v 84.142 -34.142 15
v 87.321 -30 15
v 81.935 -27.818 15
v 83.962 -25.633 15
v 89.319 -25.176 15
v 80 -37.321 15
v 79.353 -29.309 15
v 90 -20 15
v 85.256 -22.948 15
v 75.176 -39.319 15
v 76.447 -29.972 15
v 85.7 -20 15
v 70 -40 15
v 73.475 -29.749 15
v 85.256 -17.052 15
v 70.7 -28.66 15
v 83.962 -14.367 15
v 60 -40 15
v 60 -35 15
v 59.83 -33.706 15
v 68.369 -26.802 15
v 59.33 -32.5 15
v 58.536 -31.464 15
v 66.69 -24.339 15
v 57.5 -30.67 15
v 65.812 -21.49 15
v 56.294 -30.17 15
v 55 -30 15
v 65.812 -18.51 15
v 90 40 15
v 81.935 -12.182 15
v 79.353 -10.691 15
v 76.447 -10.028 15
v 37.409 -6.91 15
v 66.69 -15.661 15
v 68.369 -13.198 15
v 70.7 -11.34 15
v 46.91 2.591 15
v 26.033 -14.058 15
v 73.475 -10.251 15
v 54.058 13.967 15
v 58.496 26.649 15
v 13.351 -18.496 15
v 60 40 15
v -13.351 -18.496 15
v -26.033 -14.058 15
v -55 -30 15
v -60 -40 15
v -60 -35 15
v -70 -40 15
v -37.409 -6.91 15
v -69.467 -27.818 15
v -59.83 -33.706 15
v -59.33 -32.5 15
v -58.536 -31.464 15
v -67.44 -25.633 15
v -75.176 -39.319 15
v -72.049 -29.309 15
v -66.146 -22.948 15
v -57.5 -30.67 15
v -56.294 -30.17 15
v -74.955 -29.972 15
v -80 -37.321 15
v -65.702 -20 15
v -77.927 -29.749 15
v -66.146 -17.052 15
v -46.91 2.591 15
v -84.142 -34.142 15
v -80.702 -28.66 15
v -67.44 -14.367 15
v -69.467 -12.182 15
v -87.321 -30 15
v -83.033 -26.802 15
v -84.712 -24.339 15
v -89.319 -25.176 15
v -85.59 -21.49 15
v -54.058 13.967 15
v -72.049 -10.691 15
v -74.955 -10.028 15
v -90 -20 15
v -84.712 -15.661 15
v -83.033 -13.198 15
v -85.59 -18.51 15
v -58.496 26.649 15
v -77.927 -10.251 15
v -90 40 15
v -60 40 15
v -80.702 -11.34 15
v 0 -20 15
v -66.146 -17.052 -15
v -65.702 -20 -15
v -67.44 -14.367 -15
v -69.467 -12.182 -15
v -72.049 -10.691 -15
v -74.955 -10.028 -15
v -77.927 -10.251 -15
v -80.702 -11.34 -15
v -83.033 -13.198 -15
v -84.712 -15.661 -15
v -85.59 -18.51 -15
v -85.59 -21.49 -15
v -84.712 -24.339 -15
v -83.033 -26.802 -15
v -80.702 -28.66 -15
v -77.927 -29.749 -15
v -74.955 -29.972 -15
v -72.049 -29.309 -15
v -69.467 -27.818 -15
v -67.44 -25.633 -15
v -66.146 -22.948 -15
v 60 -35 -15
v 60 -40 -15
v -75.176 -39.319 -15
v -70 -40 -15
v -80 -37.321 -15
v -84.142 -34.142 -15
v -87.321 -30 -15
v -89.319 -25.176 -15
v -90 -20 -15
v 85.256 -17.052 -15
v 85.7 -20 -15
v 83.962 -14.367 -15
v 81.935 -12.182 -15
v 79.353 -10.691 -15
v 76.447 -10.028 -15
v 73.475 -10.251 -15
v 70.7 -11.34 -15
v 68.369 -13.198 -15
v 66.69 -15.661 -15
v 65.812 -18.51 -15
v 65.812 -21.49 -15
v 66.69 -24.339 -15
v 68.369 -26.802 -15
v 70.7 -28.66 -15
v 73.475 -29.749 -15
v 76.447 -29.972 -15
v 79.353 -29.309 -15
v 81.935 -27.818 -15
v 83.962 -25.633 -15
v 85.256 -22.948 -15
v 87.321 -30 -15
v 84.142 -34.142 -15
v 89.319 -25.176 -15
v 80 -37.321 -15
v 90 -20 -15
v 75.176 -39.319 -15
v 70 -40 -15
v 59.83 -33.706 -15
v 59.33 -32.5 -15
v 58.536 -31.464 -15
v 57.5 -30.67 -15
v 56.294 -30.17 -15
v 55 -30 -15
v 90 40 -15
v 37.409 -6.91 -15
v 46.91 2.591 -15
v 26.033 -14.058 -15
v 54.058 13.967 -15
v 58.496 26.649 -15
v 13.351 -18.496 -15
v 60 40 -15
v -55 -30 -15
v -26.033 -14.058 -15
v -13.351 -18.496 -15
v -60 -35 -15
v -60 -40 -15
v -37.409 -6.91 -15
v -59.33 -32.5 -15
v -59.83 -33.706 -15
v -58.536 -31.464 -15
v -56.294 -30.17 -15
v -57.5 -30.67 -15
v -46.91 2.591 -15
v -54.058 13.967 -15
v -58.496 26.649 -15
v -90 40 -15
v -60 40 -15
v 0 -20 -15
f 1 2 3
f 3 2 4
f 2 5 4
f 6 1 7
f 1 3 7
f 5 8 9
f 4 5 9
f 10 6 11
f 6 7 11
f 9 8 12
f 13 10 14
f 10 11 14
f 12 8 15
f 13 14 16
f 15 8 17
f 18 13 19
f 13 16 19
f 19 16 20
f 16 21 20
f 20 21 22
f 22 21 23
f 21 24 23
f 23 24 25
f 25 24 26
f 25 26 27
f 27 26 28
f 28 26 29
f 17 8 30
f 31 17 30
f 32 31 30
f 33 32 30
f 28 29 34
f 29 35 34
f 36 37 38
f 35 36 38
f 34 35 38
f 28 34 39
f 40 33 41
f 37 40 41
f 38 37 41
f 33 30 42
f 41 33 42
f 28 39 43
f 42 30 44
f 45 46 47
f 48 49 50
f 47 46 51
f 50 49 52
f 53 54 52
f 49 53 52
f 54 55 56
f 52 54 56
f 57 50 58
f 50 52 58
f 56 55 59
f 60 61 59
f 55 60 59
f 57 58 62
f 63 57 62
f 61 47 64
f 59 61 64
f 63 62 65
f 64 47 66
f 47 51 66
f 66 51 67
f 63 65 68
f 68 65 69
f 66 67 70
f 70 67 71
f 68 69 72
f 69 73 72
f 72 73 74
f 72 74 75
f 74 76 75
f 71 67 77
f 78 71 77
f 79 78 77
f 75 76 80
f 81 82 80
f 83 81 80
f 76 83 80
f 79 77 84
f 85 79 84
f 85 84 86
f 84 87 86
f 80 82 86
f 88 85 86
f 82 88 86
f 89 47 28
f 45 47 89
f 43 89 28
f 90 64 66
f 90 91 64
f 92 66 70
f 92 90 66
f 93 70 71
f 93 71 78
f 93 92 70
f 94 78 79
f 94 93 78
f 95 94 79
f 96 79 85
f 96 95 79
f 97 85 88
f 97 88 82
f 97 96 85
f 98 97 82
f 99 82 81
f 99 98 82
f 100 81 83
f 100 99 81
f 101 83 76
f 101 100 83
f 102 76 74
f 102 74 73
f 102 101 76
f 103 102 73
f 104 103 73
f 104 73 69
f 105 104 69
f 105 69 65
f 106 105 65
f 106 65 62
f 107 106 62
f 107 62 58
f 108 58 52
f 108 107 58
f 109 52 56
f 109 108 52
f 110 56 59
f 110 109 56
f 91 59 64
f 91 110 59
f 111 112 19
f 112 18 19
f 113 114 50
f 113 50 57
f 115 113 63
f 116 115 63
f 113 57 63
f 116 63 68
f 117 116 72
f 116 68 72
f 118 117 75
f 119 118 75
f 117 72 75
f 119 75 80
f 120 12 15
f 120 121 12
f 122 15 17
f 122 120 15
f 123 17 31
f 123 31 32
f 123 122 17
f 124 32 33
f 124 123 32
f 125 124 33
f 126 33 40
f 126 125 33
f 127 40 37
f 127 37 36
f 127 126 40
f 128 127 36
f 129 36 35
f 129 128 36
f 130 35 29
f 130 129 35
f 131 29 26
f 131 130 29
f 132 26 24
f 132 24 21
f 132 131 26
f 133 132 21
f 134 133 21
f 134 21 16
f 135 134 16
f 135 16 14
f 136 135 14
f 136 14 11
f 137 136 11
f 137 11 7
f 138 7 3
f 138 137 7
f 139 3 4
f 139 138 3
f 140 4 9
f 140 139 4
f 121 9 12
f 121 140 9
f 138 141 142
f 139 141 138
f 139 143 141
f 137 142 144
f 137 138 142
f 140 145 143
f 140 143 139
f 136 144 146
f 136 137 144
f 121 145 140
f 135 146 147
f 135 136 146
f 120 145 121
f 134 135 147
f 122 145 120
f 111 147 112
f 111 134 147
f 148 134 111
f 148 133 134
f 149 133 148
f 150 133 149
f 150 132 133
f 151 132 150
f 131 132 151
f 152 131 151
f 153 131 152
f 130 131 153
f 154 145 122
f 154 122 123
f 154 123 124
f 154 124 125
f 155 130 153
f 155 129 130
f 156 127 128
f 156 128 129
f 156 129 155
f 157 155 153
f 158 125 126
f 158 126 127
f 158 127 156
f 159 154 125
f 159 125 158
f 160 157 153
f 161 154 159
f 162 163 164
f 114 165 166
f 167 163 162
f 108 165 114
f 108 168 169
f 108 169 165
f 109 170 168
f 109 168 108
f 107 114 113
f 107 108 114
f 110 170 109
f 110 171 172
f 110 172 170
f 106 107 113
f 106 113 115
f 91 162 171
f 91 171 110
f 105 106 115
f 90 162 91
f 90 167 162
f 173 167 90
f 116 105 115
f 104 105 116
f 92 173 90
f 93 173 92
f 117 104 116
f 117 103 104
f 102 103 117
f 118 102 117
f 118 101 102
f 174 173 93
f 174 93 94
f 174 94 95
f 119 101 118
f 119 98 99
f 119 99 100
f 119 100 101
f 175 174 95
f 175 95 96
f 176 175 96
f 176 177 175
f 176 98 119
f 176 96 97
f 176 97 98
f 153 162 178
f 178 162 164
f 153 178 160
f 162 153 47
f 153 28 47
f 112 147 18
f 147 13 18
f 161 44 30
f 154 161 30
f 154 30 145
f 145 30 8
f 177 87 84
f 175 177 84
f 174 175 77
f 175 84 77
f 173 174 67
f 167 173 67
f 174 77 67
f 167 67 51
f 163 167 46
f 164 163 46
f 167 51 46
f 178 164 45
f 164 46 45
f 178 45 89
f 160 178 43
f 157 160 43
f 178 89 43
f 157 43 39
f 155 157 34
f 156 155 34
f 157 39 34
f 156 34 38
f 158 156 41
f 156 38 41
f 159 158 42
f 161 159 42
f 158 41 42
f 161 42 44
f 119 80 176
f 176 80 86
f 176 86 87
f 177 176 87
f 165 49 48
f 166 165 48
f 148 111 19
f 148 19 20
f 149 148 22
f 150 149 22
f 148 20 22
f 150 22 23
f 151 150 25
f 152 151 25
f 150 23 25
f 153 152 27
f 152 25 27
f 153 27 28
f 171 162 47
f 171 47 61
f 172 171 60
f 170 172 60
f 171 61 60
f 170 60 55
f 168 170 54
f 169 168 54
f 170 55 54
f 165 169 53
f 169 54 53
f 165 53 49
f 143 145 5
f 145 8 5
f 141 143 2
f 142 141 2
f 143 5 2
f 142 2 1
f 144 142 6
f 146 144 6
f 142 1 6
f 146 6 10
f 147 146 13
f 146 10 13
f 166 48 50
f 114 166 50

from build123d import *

# Parameters (mm, degrees)
SKETCH1_R           = 10
BOSS_EXTRUDE1_DEPTH = 15


with BuildPart() as part:
    # Sketch1 → Boss-Extrude1 (new, symmetric)
    with BuildSketch(Plane.XY):
        with BuildLine():
            Line((60, 40), (90, 40))
            Line((90, 40), (90, -20))
            ThreePointArc((90, -20), (84.142135624, -34.142135624), (70, -40))
            Line((70, -40), (60, -40))
            Line((60, -40), (60, -35))
            ThreePointArc((60, -35), (58.535533906, -31.464466094), (55, -30))
            Line((55, -30), (-55, -30))
            ThreePointArc((-55, -30), (-58.535533906, -31.464466094), (-60, -35))
            Line((-60, -35), (-60, -40))
            Line((-60, -40), (-70, -40))
            ThreePointArc((-70, -40), (-84.142135624, -34.142135624), (-90, -20))
            Line((-90, -20), (-90, 40))
            Line((-90, 40), (-60, 40))
            ThreePointArc((-60, 40), (0, -20), (60, 40))
        make_face()
        with Locations((-75.702110111, -20)):
            Circle(SKETCH1_R, mode=Mode.SUBTRACT)
        with Locations((75.7, -20)):
            Circle(SKETCH1_R, mode=Mode.SUBTRACT)
    extrude(amount=BOSS_EXTRUDE1_DEPTH, both=True)


solid = part.part
